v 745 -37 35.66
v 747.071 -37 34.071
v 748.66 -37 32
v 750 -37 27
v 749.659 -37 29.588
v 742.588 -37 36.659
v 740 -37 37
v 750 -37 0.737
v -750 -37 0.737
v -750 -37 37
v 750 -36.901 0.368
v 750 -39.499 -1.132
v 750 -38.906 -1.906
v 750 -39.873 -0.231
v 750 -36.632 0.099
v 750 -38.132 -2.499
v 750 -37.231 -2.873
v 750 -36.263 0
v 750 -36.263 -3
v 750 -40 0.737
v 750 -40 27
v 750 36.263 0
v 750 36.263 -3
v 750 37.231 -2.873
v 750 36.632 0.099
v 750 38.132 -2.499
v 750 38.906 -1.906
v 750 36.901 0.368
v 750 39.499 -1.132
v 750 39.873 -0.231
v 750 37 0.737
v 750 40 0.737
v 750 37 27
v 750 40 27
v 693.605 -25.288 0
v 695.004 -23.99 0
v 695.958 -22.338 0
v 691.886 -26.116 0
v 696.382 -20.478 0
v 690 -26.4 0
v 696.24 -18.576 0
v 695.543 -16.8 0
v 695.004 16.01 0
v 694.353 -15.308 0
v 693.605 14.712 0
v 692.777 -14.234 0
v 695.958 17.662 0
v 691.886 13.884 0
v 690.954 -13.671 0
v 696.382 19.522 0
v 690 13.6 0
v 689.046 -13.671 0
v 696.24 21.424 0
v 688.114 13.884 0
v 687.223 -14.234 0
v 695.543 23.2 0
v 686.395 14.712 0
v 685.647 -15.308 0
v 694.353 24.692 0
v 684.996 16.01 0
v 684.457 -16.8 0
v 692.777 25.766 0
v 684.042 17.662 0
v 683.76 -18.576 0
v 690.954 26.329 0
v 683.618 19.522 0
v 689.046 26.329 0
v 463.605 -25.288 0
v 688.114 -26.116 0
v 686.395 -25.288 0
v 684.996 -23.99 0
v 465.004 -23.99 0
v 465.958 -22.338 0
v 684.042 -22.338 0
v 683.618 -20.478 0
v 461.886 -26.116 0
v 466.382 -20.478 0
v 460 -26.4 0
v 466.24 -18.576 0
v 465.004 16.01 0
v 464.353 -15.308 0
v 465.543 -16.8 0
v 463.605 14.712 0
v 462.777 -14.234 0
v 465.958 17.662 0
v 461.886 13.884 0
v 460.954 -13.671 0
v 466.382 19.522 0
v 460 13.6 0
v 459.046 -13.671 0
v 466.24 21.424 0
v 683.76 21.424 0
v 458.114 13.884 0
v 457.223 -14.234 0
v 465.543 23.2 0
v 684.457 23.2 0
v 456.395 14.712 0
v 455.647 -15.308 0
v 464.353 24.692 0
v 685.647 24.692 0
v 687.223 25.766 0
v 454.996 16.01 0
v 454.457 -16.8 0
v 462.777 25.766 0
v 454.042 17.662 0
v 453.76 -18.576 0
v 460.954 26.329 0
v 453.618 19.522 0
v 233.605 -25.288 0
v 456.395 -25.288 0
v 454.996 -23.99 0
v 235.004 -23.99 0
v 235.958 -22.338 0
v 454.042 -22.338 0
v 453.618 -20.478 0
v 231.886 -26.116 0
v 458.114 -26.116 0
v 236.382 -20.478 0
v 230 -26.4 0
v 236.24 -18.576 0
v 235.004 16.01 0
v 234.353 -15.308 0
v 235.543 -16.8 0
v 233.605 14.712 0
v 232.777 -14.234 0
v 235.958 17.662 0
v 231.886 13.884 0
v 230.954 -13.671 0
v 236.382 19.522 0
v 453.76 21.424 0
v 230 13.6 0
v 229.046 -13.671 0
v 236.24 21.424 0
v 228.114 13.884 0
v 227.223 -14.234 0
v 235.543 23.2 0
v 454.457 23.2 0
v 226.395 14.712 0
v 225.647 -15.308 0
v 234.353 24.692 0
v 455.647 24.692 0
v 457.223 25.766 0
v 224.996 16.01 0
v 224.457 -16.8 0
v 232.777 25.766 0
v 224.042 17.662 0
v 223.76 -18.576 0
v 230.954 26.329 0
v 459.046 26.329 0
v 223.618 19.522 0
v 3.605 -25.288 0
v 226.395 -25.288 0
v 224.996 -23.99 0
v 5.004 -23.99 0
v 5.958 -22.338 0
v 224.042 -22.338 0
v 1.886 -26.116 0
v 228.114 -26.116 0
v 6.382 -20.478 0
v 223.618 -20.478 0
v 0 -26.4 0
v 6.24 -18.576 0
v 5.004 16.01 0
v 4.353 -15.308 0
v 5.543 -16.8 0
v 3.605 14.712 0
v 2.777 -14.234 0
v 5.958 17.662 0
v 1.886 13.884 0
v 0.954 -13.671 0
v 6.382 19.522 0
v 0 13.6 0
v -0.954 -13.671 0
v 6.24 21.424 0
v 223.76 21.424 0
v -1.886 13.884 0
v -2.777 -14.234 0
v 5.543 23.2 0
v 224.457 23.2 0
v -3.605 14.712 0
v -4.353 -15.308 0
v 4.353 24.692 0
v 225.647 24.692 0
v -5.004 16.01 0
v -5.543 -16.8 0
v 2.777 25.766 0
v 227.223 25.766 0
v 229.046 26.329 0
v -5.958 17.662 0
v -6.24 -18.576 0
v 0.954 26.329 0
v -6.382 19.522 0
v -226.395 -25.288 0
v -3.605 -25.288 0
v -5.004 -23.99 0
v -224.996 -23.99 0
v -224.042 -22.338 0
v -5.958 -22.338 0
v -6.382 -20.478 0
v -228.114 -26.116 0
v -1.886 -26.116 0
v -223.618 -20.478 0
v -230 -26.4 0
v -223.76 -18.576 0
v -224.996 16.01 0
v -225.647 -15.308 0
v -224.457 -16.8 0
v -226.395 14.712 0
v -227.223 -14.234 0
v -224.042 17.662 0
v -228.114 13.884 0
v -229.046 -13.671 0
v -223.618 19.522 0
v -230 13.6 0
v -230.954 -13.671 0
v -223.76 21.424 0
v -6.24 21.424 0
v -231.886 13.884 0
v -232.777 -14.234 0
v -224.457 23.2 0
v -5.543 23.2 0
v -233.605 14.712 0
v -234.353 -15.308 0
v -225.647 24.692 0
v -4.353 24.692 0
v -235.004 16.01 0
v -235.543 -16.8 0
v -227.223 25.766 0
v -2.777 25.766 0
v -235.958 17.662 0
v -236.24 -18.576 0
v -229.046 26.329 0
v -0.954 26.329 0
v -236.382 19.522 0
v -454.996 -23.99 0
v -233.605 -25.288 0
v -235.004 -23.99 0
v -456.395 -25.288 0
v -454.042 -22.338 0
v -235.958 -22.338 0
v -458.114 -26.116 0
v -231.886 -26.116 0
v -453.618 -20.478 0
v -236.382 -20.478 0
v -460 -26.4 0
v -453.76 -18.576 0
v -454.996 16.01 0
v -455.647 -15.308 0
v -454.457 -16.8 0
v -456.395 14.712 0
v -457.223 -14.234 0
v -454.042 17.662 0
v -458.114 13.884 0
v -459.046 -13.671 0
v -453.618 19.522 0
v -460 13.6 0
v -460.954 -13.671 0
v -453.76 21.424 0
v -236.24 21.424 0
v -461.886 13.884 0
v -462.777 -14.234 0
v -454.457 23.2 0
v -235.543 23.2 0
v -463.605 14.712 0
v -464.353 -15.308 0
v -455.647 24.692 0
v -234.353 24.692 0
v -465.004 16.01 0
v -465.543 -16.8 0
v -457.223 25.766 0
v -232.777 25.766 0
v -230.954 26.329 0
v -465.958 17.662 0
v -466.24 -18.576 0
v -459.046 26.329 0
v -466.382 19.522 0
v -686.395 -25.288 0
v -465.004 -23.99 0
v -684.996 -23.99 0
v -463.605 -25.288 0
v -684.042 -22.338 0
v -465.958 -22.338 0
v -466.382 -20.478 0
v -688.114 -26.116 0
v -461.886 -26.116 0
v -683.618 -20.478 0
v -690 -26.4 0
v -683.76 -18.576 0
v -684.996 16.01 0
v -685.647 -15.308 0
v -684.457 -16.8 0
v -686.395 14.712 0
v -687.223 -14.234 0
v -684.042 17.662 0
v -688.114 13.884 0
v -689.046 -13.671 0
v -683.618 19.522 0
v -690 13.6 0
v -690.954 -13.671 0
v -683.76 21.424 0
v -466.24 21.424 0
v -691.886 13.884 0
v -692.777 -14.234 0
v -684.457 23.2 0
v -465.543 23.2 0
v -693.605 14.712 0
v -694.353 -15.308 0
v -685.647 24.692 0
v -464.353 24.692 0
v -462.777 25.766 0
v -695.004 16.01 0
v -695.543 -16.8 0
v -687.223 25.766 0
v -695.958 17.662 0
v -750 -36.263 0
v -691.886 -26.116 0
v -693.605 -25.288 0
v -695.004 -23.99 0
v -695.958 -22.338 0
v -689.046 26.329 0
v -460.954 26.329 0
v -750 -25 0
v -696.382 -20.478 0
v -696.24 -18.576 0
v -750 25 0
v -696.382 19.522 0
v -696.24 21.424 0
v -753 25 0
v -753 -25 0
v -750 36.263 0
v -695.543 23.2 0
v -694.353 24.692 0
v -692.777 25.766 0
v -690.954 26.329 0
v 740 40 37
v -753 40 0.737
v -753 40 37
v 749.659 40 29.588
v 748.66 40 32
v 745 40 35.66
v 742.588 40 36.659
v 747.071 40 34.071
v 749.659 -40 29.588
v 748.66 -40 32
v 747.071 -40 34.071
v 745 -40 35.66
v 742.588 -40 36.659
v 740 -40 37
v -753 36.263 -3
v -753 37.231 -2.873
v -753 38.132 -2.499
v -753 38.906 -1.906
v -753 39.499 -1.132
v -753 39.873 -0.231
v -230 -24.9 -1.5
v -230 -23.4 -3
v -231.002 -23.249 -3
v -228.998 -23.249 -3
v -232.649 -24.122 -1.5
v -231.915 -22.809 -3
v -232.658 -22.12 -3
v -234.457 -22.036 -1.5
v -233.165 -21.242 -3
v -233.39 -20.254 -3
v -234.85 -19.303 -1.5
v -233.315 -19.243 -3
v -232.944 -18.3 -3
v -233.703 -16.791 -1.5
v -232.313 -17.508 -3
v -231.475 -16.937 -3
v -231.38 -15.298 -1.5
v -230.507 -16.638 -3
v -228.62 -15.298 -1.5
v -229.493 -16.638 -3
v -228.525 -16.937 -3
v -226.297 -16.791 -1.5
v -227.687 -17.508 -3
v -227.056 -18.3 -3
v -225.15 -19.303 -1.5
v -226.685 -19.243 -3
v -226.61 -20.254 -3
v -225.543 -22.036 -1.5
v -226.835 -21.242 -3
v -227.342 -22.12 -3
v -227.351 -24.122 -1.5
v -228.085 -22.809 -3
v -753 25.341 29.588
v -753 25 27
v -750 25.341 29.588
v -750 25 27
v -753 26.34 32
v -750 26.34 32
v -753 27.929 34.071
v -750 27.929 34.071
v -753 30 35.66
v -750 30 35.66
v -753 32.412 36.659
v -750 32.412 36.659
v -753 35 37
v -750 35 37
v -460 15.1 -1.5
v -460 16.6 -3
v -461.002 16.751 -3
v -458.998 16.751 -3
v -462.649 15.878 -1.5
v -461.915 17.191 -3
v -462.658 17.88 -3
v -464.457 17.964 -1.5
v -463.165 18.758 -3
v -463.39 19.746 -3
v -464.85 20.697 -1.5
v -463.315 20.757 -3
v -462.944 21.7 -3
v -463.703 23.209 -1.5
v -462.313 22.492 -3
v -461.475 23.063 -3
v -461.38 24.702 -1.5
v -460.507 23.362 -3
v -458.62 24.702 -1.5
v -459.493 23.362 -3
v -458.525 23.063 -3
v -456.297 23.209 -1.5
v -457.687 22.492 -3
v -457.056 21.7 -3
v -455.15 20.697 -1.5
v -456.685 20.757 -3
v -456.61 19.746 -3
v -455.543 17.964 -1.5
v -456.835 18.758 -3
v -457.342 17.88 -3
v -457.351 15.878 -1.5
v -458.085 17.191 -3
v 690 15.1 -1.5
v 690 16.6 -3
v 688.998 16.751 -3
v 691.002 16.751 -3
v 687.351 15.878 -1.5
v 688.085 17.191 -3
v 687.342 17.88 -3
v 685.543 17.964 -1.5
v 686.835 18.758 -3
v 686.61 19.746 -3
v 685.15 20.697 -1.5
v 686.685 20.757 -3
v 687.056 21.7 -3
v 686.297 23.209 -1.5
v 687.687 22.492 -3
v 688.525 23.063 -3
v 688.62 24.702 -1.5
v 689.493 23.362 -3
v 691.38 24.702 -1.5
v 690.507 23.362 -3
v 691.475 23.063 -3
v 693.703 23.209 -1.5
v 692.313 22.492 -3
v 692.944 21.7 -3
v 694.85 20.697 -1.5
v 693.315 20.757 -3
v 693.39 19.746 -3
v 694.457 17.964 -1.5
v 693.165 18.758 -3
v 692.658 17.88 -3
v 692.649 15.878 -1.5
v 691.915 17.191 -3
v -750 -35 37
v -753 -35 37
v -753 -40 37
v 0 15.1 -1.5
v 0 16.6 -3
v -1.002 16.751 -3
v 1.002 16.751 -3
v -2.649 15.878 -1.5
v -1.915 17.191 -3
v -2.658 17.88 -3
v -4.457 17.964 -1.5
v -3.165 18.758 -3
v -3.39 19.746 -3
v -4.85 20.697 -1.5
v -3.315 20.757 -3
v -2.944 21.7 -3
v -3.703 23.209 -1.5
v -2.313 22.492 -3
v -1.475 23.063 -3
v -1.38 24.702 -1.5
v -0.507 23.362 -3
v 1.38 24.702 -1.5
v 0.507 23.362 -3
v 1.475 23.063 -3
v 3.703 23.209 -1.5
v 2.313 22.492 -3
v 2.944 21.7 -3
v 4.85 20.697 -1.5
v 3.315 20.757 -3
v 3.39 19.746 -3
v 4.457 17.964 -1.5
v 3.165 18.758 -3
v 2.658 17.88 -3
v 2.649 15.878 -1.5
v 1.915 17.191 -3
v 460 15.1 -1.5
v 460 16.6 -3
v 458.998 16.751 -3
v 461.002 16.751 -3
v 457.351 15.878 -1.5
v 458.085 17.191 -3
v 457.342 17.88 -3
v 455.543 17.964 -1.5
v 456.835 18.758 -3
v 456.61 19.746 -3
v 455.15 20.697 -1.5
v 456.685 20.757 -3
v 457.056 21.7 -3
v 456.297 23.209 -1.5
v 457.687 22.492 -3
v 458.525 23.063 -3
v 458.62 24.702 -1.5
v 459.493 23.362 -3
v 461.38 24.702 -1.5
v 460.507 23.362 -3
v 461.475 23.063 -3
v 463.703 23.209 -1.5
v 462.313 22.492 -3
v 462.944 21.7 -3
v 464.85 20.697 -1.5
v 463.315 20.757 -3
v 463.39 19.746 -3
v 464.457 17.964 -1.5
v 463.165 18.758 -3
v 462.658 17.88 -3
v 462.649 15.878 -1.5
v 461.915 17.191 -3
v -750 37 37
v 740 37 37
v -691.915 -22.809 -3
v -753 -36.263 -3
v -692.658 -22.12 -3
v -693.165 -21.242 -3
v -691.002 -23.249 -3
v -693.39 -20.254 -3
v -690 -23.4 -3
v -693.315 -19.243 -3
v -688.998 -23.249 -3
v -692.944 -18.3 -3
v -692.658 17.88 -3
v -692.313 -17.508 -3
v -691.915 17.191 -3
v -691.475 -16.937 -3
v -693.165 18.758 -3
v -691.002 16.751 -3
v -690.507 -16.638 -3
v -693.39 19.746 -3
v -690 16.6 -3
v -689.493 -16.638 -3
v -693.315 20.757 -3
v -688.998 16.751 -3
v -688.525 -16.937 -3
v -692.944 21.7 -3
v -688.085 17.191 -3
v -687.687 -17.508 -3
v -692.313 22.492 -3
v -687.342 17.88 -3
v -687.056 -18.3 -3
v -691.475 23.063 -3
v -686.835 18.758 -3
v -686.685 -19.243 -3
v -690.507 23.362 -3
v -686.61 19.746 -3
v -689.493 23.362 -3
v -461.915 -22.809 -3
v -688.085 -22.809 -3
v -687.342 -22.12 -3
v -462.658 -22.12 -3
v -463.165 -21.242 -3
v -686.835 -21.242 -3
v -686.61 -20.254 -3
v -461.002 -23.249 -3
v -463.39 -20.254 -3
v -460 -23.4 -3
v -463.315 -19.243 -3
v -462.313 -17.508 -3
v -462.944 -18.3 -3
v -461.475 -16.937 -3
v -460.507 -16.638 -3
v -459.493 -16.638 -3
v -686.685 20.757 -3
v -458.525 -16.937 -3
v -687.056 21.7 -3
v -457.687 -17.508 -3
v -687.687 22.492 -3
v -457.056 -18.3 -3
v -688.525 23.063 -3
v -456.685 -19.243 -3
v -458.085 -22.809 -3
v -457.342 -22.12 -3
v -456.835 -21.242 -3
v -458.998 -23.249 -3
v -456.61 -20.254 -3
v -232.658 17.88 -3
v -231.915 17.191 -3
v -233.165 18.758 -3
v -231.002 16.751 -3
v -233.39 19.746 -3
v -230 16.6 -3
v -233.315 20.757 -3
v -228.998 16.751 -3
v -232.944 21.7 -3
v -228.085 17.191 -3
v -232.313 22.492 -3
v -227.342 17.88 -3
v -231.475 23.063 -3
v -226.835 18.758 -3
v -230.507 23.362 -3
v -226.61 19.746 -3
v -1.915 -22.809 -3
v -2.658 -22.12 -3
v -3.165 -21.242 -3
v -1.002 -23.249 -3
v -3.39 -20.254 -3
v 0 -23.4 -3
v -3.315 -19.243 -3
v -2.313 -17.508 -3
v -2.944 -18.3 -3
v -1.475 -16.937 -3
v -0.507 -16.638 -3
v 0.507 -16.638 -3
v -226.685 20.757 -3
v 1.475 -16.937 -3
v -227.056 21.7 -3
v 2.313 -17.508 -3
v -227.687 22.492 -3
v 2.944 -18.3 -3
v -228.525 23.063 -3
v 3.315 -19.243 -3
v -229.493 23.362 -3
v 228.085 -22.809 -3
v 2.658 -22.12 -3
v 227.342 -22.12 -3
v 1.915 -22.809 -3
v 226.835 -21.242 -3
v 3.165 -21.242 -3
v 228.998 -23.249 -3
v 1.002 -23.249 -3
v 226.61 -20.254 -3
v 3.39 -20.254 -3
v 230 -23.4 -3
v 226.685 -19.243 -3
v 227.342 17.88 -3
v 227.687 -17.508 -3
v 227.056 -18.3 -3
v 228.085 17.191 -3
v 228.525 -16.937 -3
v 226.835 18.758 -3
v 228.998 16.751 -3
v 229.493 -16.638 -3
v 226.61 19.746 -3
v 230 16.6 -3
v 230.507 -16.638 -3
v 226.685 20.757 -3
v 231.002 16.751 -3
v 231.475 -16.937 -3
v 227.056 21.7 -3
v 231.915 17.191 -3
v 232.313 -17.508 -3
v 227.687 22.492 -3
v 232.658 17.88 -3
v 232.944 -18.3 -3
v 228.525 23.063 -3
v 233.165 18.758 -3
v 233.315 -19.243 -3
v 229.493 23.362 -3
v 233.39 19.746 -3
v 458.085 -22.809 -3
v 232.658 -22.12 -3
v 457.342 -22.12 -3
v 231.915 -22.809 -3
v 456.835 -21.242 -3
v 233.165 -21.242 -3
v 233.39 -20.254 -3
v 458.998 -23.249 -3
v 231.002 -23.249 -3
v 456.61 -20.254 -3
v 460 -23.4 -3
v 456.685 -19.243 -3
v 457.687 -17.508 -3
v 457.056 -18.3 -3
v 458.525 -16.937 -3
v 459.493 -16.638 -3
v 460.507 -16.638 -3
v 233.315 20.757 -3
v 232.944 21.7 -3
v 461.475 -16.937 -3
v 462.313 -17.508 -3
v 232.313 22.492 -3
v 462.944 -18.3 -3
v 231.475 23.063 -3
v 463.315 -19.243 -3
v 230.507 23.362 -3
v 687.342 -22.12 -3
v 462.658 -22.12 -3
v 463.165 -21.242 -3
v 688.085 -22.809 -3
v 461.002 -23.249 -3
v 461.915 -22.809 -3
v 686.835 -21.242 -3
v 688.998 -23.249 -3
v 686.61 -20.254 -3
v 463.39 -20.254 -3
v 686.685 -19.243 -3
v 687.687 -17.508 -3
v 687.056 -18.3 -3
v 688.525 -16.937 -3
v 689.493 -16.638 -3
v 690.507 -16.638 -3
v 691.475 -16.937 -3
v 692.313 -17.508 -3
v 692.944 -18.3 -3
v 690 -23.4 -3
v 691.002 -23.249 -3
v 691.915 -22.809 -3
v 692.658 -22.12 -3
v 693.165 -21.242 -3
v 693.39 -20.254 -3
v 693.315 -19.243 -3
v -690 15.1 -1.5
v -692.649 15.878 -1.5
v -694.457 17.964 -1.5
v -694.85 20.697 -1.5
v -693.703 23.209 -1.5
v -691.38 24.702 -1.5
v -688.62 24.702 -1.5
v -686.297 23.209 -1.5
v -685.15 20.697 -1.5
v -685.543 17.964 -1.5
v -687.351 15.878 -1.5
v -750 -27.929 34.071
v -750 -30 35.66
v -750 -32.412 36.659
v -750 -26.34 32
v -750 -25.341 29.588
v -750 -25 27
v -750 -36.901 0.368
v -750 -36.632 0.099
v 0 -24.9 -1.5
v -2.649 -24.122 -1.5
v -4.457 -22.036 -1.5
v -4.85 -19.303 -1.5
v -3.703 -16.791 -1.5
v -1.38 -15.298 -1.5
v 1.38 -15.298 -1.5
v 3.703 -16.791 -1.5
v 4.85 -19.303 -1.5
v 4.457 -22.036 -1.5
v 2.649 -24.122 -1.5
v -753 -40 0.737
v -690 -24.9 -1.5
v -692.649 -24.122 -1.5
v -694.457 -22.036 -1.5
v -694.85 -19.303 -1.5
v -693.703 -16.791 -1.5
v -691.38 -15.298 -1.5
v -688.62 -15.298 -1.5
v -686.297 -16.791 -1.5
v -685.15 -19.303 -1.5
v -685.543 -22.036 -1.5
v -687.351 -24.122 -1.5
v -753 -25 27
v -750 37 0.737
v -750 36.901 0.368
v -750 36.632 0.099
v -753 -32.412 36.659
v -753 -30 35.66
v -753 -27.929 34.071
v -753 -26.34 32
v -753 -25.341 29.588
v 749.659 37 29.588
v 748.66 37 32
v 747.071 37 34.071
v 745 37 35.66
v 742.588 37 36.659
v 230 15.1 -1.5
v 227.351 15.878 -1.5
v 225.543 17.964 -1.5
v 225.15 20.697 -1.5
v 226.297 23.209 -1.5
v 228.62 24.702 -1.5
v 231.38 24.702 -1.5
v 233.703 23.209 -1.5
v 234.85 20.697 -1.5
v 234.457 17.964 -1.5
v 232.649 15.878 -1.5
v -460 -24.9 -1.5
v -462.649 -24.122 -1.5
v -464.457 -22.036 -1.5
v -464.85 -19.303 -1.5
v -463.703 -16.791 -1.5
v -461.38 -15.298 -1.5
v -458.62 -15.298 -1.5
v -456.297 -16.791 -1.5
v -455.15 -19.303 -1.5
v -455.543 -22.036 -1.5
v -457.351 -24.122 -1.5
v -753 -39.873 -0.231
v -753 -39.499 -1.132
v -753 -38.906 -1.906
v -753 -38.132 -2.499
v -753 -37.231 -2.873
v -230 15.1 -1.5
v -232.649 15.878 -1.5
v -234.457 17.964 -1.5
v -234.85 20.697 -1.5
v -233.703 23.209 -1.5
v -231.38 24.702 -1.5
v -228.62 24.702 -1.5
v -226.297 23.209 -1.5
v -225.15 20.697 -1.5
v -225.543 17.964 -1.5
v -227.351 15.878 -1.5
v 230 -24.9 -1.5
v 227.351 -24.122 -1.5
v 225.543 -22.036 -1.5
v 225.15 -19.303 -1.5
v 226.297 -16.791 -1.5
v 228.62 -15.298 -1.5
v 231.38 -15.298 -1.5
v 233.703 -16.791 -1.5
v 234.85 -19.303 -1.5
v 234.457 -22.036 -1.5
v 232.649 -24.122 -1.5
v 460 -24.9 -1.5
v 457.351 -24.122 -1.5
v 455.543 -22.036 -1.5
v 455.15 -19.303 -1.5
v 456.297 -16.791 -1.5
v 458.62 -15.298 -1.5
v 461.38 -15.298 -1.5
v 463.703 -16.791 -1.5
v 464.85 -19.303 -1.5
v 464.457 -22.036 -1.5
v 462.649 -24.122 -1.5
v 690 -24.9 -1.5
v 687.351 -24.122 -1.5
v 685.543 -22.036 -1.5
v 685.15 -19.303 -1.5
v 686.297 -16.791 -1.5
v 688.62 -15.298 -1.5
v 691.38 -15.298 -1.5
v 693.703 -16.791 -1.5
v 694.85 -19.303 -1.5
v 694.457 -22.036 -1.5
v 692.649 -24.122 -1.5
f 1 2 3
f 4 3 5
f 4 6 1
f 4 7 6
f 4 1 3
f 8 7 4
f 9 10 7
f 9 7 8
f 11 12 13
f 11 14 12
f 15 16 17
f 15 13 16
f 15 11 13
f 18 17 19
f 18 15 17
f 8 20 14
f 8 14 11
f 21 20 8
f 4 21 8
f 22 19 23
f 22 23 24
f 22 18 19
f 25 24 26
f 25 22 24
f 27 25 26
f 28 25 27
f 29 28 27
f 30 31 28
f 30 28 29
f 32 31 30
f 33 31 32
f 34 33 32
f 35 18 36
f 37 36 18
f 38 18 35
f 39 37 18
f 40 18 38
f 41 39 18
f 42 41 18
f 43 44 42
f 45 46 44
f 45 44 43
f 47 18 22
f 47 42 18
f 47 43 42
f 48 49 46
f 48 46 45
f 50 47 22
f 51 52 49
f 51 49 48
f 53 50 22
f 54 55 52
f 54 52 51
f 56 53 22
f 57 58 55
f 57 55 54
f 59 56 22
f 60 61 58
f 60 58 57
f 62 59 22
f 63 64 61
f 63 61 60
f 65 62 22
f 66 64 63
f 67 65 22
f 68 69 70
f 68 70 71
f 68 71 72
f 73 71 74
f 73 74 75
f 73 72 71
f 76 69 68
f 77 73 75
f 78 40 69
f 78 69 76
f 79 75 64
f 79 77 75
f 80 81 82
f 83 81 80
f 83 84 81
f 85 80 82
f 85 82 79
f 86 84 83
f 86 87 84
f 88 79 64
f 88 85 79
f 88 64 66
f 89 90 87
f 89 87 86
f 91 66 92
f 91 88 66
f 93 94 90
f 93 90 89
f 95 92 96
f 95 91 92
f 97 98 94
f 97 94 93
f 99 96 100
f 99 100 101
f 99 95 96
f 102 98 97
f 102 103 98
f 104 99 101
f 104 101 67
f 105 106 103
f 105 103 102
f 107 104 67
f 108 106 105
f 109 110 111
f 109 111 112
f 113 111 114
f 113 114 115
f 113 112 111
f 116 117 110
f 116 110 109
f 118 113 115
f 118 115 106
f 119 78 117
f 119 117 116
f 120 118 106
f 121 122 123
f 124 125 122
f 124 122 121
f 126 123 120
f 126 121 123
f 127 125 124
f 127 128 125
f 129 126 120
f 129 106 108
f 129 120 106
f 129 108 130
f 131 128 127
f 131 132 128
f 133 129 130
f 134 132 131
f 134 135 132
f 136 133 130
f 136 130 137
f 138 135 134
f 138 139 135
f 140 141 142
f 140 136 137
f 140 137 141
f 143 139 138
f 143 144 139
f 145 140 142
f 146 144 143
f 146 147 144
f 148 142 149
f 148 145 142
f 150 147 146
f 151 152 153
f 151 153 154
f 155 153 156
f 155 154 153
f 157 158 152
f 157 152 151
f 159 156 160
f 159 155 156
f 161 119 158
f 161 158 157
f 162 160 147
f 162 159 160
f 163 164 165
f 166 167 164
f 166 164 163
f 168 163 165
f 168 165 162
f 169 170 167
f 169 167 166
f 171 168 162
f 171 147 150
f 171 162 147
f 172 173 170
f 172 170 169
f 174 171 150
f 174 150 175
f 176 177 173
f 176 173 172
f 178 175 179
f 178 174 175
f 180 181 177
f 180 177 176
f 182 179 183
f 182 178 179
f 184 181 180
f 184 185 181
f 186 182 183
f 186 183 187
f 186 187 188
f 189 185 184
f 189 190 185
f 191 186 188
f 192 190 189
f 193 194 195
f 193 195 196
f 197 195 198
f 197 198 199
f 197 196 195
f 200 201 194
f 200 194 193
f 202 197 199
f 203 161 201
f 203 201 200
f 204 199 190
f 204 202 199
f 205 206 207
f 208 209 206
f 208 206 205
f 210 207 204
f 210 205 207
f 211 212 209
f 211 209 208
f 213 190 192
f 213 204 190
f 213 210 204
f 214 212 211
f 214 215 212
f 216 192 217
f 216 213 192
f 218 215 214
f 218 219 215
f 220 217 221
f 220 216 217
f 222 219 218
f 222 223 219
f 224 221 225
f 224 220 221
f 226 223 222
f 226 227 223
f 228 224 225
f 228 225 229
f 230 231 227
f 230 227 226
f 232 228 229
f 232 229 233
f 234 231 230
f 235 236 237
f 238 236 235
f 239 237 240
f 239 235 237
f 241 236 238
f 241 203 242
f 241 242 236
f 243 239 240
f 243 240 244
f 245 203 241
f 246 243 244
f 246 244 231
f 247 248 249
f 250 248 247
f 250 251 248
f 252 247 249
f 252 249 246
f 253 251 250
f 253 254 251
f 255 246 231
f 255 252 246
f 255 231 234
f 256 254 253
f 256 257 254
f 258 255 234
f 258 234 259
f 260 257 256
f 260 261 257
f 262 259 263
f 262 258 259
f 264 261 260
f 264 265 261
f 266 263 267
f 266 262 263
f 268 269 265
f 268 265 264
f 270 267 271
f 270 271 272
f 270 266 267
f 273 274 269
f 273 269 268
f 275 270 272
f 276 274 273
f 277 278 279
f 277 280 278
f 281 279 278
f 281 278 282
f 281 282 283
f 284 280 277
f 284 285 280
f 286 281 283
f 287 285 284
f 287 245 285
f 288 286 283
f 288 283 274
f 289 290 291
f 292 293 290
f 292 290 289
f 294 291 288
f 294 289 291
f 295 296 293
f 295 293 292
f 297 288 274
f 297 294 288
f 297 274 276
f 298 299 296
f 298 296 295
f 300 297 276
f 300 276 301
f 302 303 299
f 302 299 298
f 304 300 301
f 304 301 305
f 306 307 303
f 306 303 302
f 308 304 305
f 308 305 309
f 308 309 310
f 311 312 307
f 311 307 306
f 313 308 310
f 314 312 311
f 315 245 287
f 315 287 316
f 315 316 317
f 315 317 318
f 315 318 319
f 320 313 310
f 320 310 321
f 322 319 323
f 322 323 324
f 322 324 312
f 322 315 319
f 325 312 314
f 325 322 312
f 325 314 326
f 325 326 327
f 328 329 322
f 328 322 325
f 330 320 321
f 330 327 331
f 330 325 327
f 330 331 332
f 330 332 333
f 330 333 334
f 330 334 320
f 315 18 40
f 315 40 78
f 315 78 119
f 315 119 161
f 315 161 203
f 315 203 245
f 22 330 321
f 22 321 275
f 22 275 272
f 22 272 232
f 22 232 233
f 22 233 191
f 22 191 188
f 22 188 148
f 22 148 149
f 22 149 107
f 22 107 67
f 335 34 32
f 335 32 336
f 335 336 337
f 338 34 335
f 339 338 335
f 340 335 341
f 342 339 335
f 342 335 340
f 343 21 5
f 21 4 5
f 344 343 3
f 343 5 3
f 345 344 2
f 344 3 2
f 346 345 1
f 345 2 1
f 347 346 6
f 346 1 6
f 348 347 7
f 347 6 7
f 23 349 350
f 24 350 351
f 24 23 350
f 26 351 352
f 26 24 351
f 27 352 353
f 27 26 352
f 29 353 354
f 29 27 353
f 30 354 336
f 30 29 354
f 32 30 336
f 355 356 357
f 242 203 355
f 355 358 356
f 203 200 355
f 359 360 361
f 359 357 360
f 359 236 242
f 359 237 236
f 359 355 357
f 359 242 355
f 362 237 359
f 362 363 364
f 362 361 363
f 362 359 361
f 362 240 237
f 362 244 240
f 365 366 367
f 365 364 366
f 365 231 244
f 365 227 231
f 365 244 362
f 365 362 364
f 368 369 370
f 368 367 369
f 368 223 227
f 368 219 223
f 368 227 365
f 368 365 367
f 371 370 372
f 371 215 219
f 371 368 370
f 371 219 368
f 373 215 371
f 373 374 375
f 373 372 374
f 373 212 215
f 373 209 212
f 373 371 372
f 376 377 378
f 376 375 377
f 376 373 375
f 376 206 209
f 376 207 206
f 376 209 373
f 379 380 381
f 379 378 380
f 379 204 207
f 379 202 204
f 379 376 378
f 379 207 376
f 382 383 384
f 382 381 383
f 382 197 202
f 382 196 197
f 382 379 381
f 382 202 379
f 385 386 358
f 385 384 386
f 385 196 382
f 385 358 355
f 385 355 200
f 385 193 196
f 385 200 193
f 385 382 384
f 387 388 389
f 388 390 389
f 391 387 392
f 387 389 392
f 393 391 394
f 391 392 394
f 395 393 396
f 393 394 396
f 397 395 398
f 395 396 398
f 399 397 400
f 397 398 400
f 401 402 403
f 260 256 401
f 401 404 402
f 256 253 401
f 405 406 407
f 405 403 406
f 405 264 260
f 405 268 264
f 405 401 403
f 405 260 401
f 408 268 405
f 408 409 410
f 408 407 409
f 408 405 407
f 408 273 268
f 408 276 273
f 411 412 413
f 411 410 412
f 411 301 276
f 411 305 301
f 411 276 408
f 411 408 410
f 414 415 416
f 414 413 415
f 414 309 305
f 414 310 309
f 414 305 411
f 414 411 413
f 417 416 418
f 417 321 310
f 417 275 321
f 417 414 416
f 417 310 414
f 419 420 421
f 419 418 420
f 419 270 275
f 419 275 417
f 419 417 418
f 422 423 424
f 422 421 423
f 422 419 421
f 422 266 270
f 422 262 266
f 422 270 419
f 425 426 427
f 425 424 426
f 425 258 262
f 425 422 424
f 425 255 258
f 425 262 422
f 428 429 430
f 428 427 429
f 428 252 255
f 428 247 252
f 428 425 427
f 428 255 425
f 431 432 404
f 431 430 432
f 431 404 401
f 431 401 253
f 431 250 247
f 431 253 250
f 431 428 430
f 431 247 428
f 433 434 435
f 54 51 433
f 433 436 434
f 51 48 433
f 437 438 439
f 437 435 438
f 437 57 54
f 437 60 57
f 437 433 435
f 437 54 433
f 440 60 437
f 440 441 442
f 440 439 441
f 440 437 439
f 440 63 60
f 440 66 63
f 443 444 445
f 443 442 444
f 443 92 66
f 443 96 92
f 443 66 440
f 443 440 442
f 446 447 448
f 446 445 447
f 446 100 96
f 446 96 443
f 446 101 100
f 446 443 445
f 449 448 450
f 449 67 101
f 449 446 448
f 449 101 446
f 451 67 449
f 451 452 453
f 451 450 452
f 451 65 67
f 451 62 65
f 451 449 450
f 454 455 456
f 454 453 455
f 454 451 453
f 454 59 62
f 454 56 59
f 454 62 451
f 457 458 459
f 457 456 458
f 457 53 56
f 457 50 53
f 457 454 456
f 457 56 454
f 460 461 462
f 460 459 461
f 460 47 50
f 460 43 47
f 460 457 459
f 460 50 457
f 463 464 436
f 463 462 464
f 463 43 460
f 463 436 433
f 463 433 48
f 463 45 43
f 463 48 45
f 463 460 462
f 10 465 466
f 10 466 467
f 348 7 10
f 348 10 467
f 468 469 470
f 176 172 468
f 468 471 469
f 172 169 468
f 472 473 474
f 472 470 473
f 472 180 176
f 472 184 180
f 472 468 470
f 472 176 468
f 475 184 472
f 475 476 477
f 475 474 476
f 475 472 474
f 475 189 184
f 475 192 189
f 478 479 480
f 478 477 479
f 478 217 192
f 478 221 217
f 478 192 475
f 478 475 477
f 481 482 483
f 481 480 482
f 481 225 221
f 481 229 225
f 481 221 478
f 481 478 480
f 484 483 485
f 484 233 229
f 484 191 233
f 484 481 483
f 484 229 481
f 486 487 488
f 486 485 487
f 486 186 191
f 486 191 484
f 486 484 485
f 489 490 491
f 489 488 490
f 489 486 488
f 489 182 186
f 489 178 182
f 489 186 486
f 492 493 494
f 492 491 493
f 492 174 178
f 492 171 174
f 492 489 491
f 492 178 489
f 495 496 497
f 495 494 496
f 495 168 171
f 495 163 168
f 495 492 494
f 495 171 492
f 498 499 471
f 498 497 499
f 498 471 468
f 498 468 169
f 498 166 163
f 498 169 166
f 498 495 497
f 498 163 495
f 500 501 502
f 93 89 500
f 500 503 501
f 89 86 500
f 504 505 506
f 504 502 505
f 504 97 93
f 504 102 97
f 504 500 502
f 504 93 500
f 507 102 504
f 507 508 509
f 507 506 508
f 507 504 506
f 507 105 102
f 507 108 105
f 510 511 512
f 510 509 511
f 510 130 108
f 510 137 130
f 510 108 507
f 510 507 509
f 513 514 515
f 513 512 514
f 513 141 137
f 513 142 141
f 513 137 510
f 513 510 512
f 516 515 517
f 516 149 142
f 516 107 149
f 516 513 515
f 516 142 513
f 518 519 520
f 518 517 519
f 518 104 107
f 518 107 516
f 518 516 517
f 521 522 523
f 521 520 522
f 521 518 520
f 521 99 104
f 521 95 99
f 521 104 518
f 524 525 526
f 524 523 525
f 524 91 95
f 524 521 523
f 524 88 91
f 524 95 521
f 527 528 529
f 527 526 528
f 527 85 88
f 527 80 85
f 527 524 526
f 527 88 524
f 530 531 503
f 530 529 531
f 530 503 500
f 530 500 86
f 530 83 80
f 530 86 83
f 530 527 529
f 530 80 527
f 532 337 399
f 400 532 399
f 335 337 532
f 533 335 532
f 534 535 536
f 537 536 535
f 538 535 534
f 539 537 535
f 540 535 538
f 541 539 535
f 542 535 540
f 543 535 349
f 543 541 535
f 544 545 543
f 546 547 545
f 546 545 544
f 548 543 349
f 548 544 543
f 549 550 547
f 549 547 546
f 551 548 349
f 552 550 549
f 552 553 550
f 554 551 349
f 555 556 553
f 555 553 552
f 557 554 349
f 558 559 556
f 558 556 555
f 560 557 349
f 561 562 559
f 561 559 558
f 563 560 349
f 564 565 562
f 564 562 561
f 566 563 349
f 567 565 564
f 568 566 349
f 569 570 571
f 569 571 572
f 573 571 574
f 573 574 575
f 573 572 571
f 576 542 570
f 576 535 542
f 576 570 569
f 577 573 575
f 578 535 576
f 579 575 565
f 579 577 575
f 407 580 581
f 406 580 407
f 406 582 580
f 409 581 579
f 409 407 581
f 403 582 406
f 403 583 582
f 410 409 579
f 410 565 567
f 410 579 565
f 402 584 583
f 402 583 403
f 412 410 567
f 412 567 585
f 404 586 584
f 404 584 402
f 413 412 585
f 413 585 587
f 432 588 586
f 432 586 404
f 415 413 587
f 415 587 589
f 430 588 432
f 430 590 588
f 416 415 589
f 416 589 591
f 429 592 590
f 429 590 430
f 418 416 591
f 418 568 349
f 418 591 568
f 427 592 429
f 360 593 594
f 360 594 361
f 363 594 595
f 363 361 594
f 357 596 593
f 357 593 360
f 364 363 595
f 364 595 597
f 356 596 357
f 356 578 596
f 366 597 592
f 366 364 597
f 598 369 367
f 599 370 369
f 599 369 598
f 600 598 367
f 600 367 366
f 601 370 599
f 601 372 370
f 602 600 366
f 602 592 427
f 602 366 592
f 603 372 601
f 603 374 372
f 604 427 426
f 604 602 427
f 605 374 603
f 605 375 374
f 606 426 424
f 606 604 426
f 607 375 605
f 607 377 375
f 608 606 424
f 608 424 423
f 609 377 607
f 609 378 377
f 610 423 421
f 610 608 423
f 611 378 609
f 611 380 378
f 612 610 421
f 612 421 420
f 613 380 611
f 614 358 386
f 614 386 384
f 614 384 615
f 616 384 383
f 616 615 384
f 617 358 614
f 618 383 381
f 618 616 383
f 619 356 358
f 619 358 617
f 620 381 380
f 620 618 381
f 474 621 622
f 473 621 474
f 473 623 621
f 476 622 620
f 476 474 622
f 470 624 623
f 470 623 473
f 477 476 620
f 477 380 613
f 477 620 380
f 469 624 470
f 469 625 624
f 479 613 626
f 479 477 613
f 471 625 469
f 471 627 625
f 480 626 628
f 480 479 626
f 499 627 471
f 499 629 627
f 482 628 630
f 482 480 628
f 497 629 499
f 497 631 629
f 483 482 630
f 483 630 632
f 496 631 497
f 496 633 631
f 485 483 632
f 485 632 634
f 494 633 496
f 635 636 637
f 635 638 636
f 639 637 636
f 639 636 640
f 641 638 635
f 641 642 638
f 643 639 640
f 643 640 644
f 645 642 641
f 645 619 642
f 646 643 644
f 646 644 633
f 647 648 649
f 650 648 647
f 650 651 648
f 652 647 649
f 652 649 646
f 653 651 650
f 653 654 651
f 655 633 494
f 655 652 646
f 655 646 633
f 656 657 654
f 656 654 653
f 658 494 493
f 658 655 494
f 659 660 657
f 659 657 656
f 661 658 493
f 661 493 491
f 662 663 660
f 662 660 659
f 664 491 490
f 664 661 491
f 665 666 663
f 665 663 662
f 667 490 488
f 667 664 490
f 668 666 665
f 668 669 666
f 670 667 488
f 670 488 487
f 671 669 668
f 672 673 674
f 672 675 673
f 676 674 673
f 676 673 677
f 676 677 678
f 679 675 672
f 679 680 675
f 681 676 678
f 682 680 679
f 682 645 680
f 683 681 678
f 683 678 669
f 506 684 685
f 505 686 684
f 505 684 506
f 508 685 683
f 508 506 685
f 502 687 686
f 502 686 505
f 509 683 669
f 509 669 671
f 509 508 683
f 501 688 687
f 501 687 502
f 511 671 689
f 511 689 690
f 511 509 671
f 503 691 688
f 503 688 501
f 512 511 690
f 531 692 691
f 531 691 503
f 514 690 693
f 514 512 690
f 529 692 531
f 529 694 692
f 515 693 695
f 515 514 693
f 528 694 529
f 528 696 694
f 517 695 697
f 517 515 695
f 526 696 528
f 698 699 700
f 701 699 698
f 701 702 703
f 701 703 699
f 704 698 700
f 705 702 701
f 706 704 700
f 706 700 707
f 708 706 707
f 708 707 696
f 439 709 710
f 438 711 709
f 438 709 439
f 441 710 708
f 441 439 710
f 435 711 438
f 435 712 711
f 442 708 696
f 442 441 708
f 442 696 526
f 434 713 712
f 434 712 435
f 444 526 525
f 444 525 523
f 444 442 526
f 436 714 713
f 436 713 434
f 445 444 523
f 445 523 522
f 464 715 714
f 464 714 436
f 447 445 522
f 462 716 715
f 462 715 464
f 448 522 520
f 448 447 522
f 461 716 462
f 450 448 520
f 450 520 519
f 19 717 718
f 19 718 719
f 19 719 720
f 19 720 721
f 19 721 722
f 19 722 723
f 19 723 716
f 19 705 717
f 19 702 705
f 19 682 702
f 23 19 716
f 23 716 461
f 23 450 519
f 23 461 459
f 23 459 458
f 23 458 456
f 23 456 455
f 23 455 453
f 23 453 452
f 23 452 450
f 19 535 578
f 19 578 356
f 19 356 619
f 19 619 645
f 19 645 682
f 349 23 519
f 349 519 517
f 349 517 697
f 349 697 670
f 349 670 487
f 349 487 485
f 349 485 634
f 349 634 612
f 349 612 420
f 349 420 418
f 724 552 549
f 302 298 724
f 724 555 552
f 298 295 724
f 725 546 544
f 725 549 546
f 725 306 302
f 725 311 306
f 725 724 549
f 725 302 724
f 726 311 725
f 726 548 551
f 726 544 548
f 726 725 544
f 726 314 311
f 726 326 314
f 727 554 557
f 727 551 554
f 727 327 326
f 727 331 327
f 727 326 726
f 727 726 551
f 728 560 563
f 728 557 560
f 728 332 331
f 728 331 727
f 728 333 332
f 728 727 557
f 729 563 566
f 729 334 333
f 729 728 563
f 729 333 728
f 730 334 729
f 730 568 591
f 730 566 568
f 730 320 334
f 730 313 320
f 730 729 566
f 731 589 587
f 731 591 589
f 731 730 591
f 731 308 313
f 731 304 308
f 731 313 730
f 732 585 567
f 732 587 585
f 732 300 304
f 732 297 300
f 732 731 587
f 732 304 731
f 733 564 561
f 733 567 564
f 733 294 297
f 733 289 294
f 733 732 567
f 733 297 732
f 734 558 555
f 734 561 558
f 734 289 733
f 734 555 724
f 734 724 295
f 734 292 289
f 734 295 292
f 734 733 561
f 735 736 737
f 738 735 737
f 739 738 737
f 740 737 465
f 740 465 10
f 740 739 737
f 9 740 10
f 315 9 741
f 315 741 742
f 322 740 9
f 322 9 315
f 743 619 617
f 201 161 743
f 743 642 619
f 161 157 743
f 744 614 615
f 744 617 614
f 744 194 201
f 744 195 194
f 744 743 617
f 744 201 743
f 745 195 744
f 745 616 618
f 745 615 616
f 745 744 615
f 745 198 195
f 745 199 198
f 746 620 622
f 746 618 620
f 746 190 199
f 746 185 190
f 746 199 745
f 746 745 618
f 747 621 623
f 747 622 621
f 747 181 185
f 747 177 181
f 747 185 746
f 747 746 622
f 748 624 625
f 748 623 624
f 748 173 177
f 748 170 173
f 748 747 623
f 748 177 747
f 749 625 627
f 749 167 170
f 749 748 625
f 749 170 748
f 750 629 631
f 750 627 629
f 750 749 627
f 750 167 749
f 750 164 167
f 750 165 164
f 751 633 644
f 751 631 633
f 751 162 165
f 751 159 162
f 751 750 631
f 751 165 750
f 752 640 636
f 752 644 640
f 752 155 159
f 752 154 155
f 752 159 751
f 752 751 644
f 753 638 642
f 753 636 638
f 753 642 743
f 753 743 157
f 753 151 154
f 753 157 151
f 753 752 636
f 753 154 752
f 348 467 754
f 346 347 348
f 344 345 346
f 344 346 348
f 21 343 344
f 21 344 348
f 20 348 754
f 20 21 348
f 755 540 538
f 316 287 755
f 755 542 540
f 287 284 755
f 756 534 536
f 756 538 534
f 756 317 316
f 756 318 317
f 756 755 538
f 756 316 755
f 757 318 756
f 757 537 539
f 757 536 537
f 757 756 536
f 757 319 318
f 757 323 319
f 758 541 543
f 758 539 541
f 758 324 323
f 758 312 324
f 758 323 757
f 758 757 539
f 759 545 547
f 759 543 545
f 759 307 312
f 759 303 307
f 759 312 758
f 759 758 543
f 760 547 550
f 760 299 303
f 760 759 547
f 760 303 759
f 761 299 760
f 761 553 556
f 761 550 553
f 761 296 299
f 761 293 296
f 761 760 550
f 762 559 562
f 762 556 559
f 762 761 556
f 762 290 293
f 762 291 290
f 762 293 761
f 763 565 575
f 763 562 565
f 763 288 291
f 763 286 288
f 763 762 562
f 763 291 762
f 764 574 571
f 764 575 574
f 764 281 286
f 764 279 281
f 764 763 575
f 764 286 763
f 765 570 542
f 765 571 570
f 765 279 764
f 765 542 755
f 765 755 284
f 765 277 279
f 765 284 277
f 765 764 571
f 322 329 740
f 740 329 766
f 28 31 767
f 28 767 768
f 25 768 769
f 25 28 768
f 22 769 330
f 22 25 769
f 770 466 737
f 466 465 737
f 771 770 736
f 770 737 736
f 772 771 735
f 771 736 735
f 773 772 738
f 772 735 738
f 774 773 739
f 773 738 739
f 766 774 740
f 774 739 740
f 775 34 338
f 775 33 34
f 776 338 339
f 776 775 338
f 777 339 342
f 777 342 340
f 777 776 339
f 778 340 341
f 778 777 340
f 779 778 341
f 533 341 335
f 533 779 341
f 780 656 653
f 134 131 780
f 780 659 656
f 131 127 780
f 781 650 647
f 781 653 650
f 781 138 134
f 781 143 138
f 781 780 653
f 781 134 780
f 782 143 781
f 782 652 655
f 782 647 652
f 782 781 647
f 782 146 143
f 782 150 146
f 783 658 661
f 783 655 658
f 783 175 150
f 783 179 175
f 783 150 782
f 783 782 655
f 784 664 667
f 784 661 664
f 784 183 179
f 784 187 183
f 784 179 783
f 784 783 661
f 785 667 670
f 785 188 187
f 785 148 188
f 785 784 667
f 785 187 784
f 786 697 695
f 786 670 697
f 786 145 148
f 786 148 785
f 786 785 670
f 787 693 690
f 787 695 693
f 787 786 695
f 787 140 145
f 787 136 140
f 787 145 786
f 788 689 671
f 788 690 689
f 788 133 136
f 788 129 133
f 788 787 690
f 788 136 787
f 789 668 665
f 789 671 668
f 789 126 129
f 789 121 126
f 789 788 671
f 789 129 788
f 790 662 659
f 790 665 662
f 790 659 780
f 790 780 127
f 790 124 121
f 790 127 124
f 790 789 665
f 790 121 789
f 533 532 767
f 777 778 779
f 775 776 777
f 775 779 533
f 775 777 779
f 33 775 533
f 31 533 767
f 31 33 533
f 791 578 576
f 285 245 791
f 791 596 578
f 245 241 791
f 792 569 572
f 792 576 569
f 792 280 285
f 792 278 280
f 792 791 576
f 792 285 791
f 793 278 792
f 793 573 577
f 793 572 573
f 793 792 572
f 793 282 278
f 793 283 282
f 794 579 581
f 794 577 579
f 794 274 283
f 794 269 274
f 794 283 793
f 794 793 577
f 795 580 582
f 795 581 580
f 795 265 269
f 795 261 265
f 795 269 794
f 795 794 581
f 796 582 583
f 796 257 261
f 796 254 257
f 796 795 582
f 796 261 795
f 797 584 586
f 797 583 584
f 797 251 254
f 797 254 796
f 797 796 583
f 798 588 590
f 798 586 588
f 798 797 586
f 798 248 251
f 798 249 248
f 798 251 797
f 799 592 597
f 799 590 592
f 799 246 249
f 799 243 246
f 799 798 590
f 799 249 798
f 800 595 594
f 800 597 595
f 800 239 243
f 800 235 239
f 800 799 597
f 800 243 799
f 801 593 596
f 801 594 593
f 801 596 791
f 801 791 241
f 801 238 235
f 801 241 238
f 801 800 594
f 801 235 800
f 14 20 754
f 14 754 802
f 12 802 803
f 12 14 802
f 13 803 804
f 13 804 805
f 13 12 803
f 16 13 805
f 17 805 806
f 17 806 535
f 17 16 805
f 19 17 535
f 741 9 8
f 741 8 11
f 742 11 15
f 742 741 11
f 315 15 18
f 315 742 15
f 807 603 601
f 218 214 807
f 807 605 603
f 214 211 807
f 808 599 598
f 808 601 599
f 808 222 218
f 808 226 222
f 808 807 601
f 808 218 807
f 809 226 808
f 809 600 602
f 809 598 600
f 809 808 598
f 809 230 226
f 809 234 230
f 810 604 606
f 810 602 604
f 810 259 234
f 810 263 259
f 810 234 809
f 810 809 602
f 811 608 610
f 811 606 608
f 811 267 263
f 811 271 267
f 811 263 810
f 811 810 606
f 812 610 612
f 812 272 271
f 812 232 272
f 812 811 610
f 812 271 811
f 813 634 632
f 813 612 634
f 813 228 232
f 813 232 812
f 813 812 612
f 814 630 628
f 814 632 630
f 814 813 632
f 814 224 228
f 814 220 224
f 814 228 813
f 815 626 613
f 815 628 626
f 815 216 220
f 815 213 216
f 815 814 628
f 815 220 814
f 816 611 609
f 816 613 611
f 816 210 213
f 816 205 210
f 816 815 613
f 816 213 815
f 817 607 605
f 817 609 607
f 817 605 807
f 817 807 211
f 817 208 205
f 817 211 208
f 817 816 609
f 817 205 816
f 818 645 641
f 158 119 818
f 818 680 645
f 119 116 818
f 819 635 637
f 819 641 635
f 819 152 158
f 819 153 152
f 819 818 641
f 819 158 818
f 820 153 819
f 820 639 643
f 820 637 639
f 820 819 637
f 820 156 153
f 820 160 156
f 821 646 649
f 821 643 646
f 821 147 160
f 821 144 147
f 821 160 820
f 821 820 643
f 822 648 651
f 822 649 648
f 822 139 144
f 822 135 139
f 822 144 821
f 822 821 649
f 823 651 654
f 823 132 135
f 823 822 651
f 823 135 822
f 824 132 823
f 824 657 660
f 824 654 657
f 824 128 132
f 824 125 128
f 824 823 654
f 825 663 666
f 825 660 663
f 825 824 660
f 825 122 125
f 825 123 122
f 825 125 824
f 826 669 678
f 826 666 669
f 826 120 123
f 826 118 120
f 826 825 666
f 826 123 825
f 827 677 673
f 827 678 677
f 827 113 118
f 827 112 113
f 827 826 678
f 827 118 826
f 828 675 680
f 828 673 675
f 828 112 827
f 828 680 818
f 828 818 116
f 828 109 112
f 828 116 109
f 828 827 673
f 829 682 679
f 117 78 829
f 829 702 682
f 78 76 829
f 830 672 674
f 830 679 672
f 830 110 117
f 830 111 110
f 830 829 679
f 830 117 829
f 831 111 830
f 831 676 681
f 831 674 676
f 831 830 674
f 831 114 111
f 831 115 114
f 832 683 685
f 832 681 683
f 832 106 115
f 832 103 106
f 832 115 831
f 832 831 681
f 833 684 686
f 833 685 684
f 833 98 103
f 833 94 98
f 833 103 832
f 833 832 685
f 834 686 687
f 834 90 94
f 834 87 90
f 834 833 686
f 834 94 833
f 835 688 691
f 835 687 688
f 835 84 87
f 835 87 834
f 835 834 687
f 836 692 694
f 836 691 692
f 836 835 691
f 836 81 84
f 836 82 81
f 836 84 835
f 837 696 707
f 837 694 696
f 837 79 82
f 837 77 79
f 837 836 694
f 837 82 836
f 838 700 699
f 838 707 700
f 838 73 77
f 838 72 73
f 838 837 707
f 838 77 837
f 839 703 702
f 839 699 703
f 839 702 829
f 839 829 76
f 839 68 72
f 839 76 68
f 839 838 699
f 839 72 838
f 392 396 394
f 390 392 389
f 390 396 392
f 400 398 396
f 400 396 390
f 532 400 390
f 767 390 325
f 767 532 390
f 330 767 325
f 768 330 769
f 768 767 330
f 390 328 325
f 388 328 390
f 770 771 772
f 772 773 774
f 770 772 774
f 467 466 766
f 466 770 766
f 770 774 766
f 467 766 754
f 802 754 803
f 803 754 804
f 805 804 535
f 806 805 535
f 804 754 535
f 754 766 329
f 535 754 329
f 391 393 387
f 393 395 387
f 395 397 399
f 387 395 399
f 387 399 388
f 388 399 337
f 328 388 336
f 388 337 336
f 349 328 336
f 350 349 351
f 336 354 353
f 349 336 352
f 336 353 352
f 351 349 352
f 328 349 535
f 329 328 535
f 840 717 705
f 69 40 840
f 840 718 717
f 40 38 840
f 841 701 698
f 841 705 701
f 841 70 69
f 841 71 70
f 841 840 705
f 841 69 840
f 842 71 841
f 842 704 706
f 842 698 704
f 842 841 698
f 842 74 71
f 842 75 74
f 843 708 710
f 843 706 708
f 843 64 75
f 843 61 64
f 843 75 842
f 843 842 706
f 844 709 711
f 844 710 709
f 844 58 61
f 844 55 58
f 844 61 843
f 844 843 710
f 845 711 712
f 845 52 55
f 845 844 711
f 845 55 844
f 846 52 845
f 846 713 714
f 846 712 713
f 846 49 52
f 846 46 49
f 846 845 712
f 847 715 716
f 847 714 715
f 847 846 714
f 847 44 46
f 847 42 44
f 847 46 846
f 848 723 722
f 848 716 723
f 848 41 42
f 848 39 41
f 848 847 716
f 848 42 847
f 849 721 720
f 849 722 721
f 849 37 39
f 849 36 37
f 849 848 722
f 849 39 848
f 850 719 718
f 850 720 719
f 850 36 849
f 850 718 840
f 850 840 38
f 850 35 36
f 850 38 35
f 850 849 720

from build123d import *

# Parameters (mm, degrees)
SKETCH_1_W                         = 1500
SKETCH_1_H                         = 80
SM_BASE_FLANGE_1_DEPTH             = 3
SM_EDGE_FLANGE_1_STRIP_W           = 13.4732
SM_EDGE_FLANGE_1_STRIP_H           = 3
SM_EDGE_FLANGE_1_STRIP_CUT_DEPTH   = 1500
SM_EDGE_FLANGE_1_STRIP_2_W         = 13.4732
SM_EDGE_FLANGE_1_STRIP_2_H         = 3
SM_EDGE_FLANGE_1_STRIP_CUT_2_DEPTH = 1500
SM_EDGE_FLANGE_1_DEPTH             = 1500
SM_EDGE_FLANGE_1_BEND_DEPTH        = 1500
EXTRUDE_1_DEPTH                    = 3
SKETCH_13_W                        = 74
SKETCH_13_H                        = 50
CUT_EXTRUDE_3_DEPTH                = 3
FILLET_1_R                         = 10
HOLE_WIZARD_1_AT_2_COUNT           = 2
HOLE_WIZARD_1_AT_2_PITCH           = 40
PATTERN_LINEAR_1_COUNT             = 4
PATTERN_LINEAR_1_PITCH             = 230
PATTERN_LINEAR_1_COL_COUNT         = 4
PATTERN_LINEAR_1_COL_PITCH         = 230


# Sheet-metal steps are written as plain solids
with BuildPart() as part:
    # Sketch 1 → 基体-法兰1 (new body)
    with BuildSketch(Plane.XY):
        Rectangle(SKETCH_1_W, SKETCH_1_H)
    extrude(amount=-SM_BASE_FLANGE_1_DEPTH)

    # 边线-法兰1 strip (across the edge) → 边线-法兰1 strip cut (cut)
    with BuildSketch(Plane(origin=(-750, -40, 0), x_dir=(0, 1, 0), z_dir=(1, 0, 0))):
        with Locations((-3, -1.5)):
            Rectangle(SM_EDGE_FLANGE_1_STRIP_W, SM_EDGE_FLANGE_1_STRIP_H)
    extrude(amount=SM_EDGE_FLANGE_1_STRIP_CUT_DEPTH, mode=Mode.SUBTRACT)

    # 边线-法兰1 strip 2 (across the edge) → 边线-法兰1 strip cut 2 (cut)
    with BuildSketch(Plane(origin=(750, 40, 0), x_dir=(0, -1, 0), z_dir=(-1, 0, 0))):
        with Locations((-3, -1.5)):
            Rectangle(SM_EDGE_FLANGE_1_STRIP_2_W, SM_EDGE_FLANGE_1_STRIP_2_H)
    extrude(amount=SM_EDGE_FLANGE_1_STRIP_CUT_2_DEPTH, mode=Mode.SUBTRACT)

    # 边线-法兰1 section (across the edge) → 边线-法兰1 (add)
    with BuildSketch(Plane(origin=(-750, -40, 0), x_dir=(0, 1, 0), z_dir=(1, 0, 0))):
        with BuildLine():
            Line((0, 0.7366), (0, 37))
            Line((0, 37), (3, 37))
            Line((3, 37), (3, 0.7366))
            ThreePointArc((3, 0.7366), (3.215745145, 0.215745145), (3.7366, 0))
            Line((3.7366, 0), (3.7366, -3))
            ThreePointArc((3.7366, -3), (1.094424801, -1.905575199), (0, 0.7366))
        make_face()
    extrude(amount=SM_EDGE_FLANGE_1_DEPTH)

    # 边线-法兰1 section 2 (across the edge) → 边线-法兰1 bend (add)
    with BuildSketch(Plane(origin=(750, 40, 0), x_dir=(0, -1, 0), z_dir=(-1, 0, 0))):
        with BuildLine():
            Line((0, 0.7366), (0, 37))
            Line((0, 37), (3, 37))
            Line((3, 37), (3, 0.7366))
            ThreePointArc((3, 0.7366), (3.215745145, 0.215745145), (3.7366, 0))
            Line((3.7366, 0), (3.7366, -3))
            ThreePointArc((3.7366, -3), (1.094424801, -1.905575199), (0, 0.7366))
        make_face()
    extrude(amount=SM_EDGE_FLANGE_1_BEND_DEPTH)

    # 草图12 → 凸台-拉伸1 (add)
    with BuildSketch(Plane.ZY.offset(750)):
        with BuildLine():
            Line((37, -40), (0.7366, -40))
            ThreePointArc((0.7366, -40), (-1.905575199, -38.905575199), (-3, -36.2634))
            Line((-3, -36.2634), (-3, 36.2634))
            ThreePointArc((-3, 36.2634), (-1.905575199, 38.905575199), (0.7366, 40))
            Line((0.7366, 40), (37, 40))
            Line((37, 40), (37, -40))
        make_face()
    extrude(amount=EXTRUDE_1_DEPTH)

    # 草图13 → 切除-拉伸3 (cut)
    with BuildSketch(Plane.ZY.offset(753)):
        with Locations((37, 0)):
            Rectangle(SKETCH_13_W, SKETCH_13_H)
    extrude(amount=-CUT_EXTRUDE_3_DEPTH, mode=Mode.SUBTRACT)

    # 圆角1
    fillet_1_edges = [part.edges().sort_by_distance(p)[0] for p in [
        (-751.5, 25, 37),
        (-751.5, -25, 37),
        (750, -38.5, 37),
        (750, 38.5, 37),
    ]]
    fillet(fillet_1_edges, radius=FILLET_1_R)

    # 草图15 → 打孔尺寸(%根据)内六角花形沉头螺钉的类型1 (revolve, cut)
    with BuildSketch(Plane(origin=(0, 20, 0), x_dir=(0, -1, 0), z_dir=(1, 0, 0))):
        Polygon((0, 0), (0, 26.482840043), (3.3, 24.5), (3.3, 3.1), (6.4, 0), align=None)
    hole_wizard_1 = revolve(axis=Axis((0, 20, 6.35), (0, 0, -1)), mode=Mode.SUBTRACT)

    # 打孔尺寸(%根据)内六角花形沉头螺钉的类型1 at 2: 打孔尺寸(%根据)内六角花形沉头螺钉的类型1 ×2
    with Locations(*[(0, -i * HOLE_WIZARD_1_AT_2_PITCH, 0) for i in range(1, HOLE_WIZARD_1_AT_2_COUNT)]):
        add(hole_wizard_1, mode=Mode.SUBTRACT)

    # 阵列(线性)1: 打孔尺寸(%根据)内六角花形沉头螺钉的类型1 ×4
    with Locations(*[(-i * PATTERN_LINEAR_1_PITCH, 0, 0) for i in range(1, PATTERN_LINEAR_1_COUNT)]):
        add(hole_wizard_1, mode=Mode.SUBTRACT)

    # 阵列(线性)1 copy 1 sketch → 阵列(线性)1 copy 1 (revolve, cut)
    with BuildSketch(Plane(origin=(-230, -20, 0), x_dir=(0, -1, 0), z_dir=(1, 0, 0))):
        Polygon((0, 0), (0, 26.482840043), (3.3, 24.5), (3.3, 3.1), (6.4, 0), align=None)
    revolve(axis=Axis((-230, -20, 6.35), (0, 0, -1)), mode=Mode.SUBTRACT)

    # 阵列(线性)1 copy 2 sketch → 阵列(线性)1 copy 2 (revolve, cut)
    with BuildSketch(Plane(origin=(-460, -20, 0), x_dir=(0, -1, 0), z_dir=(1, 0, 0))):
        Polygon((0, 0), (0, 26.482840043), (3.3, 24.5), (3.3, 3.1), (6.4, 0), align=None)
    revolve(axis=Axis((-460, -20, 6.35), (0, 0, -1)), mode=Mode.SUBTRACT)

    # 阵列(线性)1 copy 3 sketch → 阵列(线性)1 copy 3 (revolve, cut)
    with BuildSketch(Plane(origin=(-690, -20, 0), x_dir=(0, -1, 0), z_dir=(1, 0, 0))):
        Polygon((0, 0), (0, 26.482840043), (3.3, 24.5), (3.3, 3.1), (6.4, 0), align=None)
    revolve(axis=Axis((-690, -20, 6.35), (0, 0, -1)), mode=Mode.SUBTRACT)

    # 阵列(线性)1 col: 打孔尺寸(%根据)内六角花形沉头螺钉的类型1 ×4
    with Locations(*[(i * PATTERN_LINEAR_1_COL_PITCH, 0, 0) for i in range(1, PATTERN_LINEAR_1_COL_COUNT)]):
        add(hole_wizard_1, mode=Mode.SUBTRACT)

    # 阵列(线性)1 col copy 1 sketch → 阵列(线性)1 col copy 1 (revolve, cut)
    with BuildSketch(Plane(origin=(230, -20, 0), x_dir=(0, -1, 0), z_dir=(1, 0, 0))):
        Polygon((0, 0), (0, 26.482840043), (3.3, 24.5), (3.3, 3.1), (6.4, 0), align=None)
    revolve(axis=Axis((230, -20, 6.35), (0, 0, -1)), mode=Mode.SUBTRACT)

    # 阵列(线性)1 col copy 2 sketch → 阵列(线性)1 col copy 2 (revolve, cut)
    with BuildSketch(Plane(origin=(460, -20, 0), x_dir=(0, -1, 0), z_dir=(1, 0, 0))):
        Polygon((0, 0), (0, 26.482840043), (3.3, 24.5), (3.3, 3.1), (6.4, 0), align=None)
    revolve(axis=Axis((460, -20, 6.35), (0, 0, -1)), mode=Mode.SUBTRACT)

    # 阵列(线性)1 col copy 3 sketch → 阵列(线性)1 col copy 3 (revolve, cut)
    with BuildSketch(Plane(origin=(690, -20, 0), x_dir=(0, -1, 0), z_dir=(1, 0, 0))):
        Polygon((0, 0), (0, 26.482840043), (3.3, 24.5), (3.3, 3.1), (6.4, 0), align=None)
    revolve(axis=Axis((690, -20, 6.35), (0, 0, -1)), mode=Mode.SUBTRACT)


solid = part.part
